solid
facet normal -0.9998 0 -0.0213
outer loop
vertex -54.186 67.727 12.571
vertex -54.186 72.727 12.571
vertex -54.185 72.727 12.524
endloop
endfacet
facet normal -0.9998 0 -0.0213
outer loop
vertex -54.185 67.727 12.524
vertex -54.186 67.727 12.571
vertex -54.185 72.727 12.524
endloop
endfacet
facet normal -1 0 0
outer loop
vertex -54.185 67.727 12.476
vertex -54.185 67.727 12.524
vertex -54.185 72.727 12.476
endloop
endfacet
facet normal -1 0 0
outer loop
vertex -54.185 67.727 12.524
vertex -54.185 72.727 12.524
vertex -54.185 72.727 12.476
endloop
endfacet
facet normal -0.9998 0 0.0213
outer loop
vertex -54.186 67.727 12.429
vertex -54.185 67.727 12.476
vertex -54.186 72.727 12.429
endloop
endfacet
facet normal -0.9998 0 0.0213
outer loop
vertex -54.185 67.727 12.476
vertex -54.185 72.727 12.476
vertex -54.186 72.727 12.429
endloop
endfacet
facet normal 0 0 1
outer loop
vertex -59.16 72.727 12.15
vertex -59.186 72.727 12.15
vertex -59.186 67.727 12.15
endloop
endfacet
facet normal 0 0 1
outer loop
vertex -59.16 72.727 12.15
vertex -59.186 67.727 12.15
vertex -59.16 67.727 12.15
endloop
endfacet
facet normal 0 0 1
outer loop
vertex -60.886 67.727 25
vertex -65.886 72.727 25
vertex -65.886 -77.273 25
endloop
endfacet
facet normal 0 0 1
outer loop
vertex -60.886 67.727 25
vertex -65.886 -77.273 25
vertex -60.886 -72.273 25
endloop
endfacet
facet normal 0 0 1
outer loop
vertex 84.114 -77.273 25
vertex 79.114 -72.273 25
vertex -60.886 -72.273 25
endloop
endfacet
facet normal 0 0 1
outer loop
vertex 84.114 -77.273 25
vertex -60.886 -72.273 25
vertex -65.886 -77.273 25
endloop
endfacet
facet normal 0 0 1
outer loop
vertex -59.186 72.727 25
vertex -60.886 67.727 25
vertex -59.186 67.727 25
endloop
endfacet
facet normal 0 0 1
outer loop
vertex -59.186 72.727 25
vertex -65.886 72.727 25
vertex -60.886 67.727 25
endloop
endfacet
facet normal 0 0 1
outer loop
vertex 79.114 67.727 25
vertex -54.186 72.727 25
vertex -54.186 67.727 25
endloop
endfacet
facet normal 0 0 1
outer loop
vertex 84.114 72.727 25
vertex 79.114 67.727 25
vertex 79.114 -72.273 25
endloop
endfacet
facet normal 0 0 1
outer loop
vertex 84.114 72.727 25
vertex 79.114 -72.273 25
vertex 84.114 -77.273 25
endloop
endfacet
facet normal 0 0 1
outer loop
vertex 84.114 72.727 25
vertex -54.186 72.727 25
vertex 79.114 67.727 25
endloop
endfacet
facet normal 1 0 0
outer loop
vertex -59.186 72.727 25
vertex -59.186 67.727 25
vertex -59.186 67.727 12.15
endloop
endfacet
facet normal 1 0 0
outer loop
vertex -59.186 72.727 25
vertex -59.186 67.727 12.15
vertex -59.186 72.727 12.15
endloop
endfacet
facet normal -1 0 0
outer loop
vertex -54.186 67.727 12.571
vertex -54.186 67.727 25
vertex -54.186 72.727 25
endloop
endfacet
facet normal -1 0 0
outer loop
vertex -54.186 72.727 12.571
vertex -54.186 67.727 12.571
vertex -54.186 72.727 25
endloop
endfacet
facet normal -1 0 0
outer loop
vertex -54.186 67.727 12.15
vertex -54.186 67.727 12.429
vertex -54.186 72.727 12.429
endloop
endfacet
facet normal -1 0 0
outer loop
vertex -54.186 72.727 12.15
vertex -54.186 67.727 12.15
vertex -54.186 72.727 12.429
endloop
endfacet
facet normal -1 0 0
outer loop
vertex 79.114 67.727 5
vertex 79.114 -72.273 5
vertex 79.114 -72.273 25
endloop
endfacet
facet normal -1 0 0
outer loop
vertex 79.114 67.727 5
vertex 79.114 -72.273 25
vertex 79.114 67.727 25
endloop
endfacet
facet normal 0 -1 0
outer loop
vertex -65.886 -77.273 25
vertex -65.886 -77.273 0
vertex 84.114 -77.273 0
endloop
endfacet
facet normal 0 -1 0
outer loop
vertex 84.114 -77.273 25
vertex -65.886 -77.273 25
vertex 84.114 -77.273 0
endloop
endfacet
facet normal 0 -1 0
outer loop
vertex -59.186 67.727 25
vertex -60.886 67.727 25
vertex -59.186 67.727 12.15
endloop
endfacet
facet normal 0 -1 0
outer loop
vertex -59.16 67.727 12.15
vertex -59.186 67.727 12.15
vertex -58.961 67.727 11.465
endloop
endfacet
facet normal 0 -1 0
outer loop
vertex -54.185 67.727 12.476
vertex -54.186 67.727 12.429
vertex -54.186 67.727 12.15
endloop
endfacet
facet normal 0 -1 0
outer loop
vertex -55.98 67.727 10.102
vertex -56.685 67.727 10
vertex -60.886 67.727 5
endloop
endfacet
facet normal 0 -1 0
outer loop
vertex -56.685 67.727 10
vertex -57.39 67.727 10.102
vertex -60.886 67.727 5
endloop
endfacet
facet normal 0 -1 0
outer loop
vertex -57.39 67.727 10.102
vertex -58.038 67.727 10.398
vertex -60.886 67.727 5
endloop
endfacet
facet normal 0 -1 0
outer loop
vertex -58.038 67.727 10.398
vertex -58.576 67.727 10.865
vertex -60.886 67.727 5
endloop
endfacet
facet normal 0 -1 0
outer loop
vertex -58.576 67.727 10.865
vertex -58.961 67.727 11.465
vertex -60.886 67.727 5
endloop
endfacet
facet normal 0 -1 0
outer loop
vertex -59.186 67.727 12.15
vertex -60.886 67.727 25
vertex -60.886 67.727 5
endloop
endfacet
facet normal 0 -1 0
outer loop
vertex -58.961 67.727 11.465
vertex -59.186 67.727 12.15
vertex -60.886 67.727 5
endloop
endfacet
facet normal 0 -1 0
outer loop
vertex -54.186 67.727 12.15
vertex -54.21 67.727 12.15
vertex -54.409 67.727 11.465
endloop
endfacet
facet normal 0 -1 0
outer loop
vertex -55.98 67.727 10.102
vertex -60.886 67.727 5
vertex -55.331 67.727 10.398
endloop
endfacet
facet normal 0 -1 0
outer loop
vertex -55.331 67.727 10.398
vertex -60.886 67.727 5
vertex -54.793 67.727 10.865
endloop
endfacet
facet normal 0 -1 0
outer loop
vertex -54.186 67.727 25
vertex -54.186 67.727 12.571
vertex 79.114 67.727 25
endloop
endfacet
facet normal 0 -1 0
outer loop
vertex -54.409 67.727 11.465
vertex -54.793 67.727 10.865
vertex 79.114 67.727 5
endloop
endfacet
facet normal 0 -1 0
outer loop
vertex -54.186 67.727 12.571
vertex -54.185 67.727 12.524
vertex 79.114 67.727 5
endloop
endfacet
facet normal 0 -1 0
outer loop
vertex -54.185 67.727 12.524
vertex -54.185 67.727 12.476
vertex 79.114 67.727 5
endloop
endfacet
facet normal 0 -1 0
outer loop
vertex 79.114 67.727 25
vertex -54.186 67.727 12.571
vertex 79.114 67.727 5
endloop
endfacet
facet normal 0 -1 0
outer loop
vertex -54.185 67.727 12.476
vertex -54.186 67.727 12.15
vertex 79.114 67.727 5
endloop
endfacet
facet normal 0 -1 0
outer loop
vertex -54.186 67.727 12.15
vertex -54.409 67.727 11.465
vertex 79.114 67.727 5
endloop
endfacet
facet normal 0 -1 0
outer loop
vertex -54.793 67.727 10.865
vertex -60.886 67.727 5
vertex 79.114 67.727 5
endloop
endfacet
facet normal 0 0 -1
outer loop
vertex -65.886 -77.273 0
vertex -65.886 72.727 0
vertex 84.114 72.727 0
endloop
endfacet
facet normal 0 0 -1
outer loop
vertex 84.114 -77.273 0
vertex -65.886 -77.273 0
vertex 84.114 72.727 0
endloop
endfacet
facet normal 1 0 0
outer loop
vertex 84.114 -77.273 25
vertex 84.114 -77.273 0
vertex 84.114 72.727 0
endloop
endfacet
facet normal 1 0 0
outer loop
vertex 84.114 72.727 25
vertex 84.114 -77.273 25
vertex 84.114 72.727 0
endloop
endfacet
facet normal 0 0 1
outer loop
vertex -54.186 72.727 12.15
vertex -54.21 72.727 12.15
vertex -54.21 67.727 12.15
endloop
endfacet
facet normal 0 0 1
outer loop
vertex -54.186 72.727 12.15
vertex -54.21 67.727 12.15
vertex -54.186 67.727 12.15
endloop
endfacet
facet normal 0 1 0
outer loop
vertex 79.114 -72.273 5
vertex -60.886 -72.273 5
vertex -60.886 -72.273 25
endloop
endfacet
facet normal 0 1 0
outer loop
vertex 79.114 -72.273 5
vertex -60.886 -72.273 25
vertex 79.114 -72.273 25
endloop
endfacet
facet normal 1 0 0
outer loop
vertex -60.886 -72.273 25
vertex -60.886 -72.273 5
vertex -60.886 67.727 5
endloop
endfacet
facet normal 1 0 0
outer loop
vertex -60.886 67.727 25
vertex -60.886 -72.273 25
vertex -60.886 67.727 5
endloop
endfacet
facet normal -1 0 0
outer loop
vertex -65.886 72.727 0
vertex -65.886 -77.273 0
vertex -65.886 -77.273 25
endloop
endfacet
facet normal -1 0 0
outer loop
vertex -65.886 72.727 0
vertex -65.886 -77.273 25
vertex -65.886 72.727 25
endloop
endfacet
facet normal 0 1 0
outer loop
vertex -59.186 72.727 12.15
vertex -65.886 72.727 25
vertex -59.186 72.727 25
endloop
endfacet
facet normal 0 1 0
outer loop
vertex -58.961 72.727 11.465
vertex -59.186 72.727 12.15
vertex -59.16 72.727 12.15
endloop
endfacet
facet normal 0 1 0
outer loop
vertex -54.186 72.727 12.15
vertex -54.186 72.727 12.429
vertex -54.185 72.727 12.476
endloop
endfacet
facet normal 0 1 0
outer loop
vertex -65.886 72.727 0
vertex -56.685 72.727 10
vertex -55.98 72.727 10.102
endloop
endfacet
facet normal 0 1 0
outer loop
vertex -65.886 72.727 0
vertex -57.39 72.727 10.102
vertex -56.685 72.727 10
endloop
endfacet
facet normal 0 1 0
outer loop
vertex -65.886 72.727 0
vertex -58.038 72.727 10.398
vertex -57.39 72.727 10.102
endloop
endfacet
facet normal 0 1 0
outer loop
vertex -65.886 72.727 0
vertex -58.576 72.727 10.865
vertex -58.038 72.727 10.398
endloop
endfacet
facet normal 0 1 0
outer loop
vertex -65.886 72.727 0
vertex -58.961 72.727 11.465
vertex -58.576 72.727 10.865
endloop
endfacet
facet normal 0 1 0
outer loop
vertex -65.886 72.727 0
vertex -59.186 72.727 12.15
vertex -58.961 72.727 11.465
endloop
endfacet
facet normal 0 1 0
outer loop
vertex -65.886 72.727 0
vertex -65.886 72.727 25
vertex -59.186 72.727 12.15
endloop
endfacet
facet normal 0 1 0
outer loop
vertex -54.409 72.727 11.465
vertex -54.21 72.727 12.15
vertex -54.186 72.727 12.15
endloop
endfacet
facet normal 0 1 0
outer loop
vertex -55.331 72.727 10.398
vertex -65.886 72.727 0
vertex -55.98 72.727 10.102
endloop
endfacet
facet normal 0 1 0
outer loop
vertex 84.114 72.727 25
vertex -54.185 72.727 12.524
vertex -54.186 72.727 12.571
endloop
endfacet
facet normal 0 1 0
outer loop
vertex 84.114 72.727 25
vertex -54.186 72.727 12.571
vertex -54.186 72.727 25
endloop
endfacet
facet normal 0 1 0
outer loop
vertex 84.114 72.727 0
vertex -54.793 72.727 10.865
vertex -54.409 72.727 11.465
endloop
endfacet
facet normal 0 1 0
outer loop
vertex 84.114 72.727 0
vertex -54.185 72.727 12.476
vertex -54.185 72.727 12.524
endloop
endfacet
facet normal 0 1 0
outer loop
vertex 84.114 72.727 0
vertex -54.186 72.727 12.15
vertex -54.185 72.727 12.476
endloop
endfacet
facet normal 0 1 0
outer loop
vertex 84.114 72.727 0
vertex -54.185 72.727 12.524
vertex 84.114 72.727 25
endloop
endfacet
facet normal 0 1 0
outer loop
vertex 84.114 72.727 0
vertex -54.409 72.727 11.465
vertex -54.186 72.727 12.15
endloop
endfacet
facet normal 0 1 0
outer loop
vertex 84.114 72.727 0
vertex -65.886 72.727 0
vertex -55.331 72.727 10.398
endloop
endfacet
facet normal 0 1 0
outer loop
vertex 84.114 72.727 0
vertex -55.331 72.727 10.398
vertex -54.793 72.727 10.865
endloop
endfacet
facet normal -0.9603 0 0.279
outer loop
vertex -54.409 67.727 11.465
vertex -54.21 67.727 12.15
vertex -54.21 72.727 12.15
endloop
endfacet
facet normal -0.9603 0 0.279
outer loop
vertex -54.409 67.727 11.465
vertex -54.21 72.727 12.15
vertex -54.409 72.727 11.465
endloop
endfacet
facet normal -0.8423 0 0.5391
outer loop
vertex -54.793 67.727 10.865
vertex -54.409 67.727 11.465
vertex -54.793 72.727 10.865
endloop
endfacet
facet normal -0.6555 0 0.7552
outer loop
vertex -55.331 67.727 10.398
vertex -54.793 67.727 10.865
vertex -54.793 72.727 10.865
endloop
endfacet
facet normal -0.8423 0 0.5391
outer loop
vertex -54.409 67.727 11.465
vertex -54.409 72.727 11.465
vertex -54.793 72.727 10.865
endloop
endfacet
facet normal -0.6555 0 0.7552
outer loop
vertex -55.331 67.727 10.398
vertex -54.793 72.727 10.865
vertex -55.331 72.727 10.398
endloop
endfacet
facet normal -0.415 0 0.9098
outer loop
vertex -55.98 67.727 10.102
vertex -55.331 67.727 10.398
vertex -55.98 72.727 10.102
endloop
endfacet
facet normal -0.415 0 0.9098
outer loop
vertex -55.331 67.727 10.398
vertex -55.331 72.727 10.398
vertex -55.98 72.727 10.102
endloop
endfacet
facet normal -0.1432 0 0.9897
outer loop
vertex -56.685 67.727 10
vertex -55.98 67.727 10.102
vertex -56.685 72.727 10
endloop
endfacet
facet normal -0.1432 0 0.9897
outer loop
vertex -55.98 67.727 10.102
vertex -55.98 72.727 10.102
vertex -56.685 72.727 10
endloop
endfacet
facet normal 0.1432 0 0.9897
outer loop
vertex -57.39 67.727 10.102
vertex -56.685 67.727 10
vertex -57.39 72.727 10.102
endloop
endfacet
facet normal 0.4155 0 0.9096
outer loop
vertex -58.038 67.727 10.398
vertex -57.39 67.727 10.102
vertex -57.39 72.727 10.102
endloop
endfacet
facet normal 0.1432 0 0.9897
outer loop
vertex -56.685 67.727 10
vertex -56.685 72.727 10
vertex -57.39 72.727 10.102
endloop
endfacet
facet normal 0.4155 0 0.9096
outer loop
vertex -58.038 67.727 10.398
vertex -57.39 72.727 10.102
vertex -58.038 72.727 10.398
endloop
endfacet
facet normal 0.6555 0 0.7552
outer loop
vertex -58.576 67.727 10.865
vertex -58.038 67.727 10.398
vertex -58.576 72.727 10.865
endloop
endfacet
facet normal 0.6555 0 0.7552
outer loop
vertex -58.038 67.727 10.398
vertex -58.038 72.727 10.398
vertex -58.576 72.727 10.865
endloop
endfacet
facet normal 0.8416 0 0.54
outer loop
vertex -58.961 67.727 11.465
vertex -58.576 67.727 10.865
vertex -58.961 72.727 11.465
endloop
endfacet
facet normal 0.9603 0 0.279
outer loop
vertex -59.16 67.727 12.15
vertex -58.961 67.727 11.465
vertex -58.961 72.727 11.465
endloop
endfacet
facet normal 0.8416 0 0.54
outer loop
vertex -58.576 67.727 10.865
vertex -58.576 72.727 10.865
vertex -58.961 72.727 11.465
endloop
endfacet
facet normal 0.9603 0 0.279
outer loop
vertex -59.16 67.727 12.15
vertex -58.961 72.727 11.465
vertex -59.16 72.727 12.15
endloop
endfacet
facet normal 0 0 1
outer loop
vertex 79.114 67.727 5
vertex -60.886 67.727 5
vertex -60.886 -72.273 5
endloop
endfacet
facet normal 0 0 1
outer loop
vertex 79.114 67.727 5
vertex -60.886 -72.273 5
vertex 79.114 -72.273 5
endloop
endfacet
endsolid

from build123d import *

# Parameters (mm, degrees)
F0_W     = 150
F0_H     = 150
F0_W_2   = 140
F0_H_2   = 140
F1_DEPTH = 25
F2_DEPTH = 5
F3_R     = 2.5
F4_DEPTH = 6
F5_W     = 5
F5_H     = 5
F6_DEPTH = 12.85037


with BuildPart() as f1:
    # F0 (on Top) → F1 (new body)
    with BuildSketch(Plane.XY):
        with Locations((9.114077, -2.272729)):
            Rectangle(F0_W, F0_H)
        with Locations((9.114077, -2.272729)):
            Rectangle(F0_W_2, F0_H_2, mode=Mode.SUBTRACT)
    extrude(amount=F1_DEPTH)

    # F0 (on Top) → F2 (join)
    with BuildSketch(Plane.XY):
        with Locations((9.114077, -2.272729)):
            Rectangle(F0_W_2, F0_H_2)
    extrude(amount=F2_DEPTH)

    # F3 (on face) → F4 (cut)
    with BuildSketch(Plane(origin=(0, 72.727271, 0), x_dir=(-1, 0, 0), z_dir=(0, 1, 0))):
        with Locations((56.684904, 12.5)):
            Circle(F3_R)
    extrude(amount=-F4_DEPTH, mode=Mode.SUBTRACT)

    # F5 (on face) → F6 (cut)
    with BuildSketch(Plane.XY.offset(25)):
        with Locations((-56.685923, 70.227271)):
            Rectangle(F5_W, F5_H)
    extrude(amount=-F6_DEPTH, mode=Mode.SUBTRACT)


solid = f1.part
